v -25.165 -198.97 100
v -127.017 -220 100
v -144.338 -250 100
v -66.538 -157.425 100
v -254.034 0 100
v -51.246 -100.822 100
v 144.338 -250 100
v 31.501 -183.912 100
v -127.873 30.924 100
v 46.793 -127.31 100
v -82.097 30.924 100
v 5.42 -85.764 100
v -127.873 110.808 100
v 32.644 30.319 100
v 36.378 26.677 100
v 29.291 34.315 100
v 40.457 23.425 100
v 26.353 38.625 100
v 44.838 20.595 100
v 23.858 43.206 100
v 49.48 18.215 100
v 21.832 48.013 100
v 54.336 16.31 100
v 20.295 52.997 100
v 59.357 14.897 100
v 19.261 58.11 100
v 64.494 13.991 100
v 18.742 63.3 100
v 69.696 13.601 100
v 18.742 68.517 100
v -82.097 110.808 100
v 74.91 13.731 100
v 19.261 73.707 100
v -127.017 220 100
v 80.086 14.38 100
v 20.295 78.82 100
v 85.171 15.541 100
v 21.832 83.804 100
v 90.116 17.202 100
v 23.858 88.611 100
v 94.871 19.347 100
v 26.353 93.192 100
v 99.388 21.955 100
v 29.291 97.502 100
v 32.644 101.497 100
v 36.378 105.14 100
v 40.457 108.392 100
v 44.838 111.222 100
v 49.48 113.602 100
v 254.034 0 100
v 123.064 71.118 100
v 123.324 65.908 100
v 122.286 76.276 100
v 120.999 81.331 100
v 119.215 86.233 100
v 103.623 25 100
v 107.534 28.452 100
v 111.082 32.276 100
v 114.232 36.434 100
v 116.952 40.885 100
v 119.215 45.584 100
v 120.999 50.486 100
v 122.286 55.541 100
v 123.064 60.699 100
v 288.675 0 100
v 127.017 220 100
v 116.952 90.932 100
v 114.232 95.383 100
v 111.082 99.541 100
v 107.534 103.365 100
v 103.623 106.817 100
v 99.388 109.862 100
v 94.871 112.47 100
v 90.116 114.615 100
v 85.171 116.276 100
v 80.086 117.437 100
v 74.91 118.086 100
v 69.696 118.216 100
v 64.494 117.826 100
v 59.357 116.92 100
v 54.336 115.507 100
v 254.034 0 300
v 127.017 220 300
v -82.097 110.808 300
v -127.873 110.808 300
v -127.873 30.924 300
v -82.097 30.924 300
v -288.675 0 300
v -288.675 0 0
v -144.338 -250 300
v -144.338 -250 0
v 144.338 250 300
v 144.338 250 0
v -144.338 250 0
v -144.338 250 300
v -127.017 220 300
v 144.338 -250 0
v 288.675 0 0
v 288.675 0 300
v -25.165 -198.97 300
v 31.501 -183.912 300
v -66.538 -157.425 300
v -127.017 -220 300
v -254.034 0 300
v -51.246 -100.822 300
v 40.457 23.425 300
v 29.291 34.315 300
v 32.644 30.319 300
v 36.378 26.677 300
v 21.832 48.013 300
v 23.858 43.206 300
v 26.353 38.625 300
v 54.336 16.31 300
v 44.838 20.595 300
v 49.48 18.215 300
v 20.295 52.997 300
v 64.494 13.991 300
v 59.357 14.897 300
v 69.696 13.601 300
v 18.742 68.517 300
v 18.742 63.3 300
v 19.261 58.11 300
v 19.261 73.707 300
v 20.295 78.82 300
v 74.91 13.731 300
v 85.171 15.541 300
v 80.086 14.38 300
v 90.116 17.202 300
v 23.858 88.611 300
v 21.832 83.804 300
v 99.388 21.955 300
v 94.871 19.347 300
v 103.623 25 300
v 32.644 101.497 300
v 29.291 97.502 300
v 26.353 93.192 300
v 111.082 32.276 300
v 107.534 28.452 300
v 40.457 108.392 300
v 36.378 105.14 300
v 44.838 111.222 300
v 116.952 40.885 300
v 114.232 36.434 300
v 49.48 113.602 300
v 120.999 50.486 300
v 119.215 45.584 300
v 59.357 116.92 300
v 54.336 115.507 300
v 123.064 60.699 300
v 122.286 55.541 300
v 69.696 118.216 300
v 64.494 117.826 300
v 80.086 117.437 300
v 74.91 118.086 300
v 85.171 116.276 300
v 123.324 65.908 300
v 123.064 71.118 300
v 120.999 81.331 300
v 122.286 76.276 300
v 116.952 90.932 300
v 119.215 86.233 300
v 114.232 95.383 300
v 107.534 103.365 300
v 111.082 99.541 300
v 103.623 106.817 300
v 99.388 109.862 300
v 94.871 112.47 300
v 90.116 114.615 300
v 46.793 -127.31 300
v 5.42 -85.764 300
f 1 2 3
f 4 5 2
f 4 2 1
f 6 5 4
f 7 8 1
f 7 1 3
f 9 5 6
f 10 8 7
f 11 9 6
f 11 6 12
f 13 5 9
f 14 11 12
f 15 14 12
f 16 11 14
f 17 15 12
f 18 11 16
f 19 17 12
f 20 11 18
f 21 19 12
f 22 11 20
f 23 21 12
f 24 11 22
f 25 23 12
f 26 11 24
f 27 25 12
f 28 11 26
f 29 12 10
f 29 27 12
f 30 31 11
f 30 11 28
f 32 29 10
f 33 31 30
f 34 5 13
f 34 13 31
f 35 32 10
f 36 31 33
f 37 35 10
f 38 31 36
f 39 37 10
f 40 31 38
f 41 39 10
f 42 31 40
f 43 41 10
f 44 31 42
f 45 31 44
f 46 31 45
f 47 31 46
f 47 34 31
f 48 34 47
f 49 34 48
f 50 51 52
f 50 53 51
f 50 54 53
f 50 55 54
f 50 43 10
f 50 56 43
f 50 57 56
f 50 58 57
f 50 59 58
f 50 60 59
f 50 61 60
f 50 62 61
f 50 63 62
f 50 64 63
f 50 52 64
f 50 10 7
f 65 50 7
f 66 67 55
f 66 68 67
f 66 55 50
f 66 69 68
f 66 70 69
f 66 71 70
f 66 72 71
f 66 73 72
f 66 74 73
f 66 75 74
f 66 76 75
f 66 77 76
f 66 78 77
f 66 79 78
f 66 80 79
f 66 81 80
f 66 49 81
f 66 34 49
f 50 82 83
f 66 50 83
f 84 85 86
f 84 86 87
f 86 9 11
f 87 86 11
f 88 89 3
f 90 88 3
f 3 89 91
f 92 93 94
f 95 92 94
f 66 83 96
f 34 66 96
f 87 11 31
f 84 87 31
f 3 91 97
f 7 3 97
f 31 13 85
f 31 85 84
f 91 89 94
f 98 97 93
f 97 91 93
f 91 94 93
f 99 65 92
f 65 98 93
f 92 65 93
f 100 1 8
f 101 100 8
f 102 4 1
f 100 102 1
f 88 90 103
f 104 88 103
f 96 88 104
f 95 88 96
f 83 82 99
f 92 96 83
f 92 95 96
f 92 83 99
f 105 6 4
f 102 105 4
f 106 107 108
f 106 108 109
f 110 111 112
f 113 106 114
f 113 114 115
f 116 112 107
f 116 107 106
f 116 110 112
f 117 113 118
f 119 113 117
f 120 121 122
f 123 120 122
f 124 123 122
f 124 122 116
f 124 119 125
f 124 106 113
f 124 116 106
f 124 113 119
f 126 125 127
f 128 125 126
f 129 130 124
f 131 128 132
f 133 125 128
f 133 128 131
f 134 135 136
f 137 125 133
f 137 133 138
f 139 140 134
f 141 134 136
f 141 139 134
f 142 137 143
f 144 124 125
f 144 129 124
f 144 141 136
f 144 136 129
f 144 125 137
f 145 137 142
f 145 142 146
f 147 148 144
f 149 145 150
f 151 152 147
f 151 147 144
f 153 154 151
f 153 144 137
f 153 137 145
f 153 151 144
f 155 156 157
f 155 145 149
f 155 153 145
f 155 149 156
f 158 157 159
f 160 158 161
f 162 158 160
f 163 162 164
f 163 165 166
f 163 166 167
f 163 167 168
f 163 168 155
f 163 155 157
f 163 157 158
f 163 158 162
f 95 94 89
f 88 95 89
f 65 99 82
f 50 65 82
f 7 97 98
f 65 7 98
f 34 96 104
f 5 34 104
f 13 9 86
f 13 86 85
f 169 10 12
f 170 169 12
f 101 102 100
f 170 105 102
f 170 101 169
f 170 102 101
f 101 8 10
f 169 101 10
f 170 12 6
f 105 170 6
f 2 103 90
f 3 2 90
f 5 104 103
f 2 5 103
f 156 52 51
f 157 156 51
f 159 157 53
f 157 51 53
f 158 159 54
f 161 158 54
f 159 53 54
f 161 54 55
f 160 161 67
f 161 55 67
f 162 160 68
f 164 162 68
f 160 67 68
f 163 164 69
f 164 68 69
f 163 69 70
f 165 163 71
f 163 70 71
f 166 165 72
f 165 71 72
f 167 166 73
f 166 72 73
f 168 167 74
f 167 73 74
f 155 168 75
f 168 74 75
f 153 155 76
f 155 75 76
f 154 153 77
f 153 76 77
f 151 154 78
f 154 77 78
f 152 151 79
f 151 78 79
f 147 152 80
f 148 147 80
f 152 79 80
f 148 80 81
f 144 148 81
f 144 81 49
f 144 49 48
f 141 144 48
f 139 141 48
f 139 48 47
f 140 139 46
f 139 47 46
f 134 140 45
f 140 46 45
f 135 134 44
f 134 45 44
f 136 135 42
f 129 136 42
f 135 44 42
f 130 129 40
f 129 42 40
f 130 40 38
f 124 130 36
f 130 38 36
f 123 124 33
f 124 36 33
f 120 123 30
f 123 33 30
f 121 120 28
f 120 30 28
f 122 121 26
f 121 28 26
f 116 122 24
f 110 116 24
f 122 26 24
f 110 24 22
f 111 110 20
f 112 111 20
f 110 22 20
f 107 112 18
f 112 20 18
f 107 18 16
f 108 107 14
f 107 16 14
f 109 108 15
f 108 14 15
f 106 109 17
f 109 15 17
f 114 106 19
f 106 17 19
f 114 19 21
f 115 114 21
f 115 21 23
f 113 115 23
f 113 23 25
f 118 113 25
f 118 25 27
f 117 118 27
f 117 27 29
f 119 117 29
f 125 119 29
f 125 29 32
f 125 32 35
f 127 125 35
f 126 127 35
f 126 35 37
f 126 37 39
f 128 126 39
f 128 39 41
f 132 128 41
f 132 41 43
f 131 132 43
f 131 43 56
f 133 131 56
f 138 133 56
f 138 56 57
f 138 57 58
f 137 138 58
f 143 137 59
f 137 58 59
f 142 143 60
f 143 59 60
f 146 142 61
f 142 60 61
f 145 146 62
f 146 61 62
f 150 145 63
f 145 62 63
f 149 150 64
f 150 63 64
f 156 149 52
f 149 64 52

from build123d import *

# Parameters (mm, degrees)
BOSS_EXTRUDE1_DEPTH = 300
CUT_EXTRUDE1_DEPTH  = 200
CUT_EXTRUDE2_DEPTH  = 200
SKETCH4_R           = 52.323508973
SKETCH4_W           = 45.776374161
SKETCH4_H           = 79.884183104
BOSS_EXTRUDE2_DEPTH = 200
BOSS_EXTRUDE3_DEPTH = 200


with BuildPart() as part:
    # Sketch1 → Boss-Extrude1 (new body)
    with BuildSketch(Plane.XY):
        Polygon((144.337567297, -250), (288.675134595, 0), (144.337567297, 250), (-144.337567297, 250), (-288.675134595, 0), (-144.337567297, -250), align=None)
    extrude(amount=BOSS_EXTRUDE1_DEPTH)

    # Sketch2 → Cut-Extrude1 (cut)
    with BuildSketch(Plane.XY.offset(300)):
        Polygon((254.034118443, 0), (127.017059222, 220), (-127.017059222, 220), (-254.034118443, 0), (-127.017059222, -220), (127.017059222, -220), align=None)
    extrude(amount=-CUT_EXTRUDE1_DEPTH, mode=Mode.SUBTRACT)

    # Sketch3 → Cut-Extrude2 (cut)
    with BuildSketch(Plane.XY.offset(300)):
        Polygon((-127.017059222, -220), (-144.337567297, -250), (-253.098126512, -358.157726196), (520.522562071, -384.900169752), (552.995529246, 34.383141715), (288.675134595, 0), (254.034118443, 0), align=None)
    extrude(amount=-CUT_EXTRUDE2_DEPTH, mode=Mode.SUBTRACT)

    # Sketch4 → Boss-Extrude2 (add)
    with BuildSketch(Plane.XY.offset(100)):
        with Locations((71.000041779, 65.908432745)):
            Circle(SKETCH4_R)
        with Locations((-104.985312432, 70.865886515)):
            Rectangle(SKETCH4_W, SKETCH4_H)
    extrude(amount=BOSS_EXTRUDE2_DEPTH)

    # Sketch5 → Boss-Extrude3 (add)
    with BuildSketch(Plane.XY.offset(100)):
        Polygon((46.793412905, -127.30955218), (5.420185833, -85.764472901), (-51.245521762, -100.822198942), (-66.538002284, -157.425004263), (-25.164775212, -198.970083543), (31.500932383, -183.912357501), align=None)
    extrude(amount=BOSS_EXTRUDE3_DEPTH)


solid = part.part
